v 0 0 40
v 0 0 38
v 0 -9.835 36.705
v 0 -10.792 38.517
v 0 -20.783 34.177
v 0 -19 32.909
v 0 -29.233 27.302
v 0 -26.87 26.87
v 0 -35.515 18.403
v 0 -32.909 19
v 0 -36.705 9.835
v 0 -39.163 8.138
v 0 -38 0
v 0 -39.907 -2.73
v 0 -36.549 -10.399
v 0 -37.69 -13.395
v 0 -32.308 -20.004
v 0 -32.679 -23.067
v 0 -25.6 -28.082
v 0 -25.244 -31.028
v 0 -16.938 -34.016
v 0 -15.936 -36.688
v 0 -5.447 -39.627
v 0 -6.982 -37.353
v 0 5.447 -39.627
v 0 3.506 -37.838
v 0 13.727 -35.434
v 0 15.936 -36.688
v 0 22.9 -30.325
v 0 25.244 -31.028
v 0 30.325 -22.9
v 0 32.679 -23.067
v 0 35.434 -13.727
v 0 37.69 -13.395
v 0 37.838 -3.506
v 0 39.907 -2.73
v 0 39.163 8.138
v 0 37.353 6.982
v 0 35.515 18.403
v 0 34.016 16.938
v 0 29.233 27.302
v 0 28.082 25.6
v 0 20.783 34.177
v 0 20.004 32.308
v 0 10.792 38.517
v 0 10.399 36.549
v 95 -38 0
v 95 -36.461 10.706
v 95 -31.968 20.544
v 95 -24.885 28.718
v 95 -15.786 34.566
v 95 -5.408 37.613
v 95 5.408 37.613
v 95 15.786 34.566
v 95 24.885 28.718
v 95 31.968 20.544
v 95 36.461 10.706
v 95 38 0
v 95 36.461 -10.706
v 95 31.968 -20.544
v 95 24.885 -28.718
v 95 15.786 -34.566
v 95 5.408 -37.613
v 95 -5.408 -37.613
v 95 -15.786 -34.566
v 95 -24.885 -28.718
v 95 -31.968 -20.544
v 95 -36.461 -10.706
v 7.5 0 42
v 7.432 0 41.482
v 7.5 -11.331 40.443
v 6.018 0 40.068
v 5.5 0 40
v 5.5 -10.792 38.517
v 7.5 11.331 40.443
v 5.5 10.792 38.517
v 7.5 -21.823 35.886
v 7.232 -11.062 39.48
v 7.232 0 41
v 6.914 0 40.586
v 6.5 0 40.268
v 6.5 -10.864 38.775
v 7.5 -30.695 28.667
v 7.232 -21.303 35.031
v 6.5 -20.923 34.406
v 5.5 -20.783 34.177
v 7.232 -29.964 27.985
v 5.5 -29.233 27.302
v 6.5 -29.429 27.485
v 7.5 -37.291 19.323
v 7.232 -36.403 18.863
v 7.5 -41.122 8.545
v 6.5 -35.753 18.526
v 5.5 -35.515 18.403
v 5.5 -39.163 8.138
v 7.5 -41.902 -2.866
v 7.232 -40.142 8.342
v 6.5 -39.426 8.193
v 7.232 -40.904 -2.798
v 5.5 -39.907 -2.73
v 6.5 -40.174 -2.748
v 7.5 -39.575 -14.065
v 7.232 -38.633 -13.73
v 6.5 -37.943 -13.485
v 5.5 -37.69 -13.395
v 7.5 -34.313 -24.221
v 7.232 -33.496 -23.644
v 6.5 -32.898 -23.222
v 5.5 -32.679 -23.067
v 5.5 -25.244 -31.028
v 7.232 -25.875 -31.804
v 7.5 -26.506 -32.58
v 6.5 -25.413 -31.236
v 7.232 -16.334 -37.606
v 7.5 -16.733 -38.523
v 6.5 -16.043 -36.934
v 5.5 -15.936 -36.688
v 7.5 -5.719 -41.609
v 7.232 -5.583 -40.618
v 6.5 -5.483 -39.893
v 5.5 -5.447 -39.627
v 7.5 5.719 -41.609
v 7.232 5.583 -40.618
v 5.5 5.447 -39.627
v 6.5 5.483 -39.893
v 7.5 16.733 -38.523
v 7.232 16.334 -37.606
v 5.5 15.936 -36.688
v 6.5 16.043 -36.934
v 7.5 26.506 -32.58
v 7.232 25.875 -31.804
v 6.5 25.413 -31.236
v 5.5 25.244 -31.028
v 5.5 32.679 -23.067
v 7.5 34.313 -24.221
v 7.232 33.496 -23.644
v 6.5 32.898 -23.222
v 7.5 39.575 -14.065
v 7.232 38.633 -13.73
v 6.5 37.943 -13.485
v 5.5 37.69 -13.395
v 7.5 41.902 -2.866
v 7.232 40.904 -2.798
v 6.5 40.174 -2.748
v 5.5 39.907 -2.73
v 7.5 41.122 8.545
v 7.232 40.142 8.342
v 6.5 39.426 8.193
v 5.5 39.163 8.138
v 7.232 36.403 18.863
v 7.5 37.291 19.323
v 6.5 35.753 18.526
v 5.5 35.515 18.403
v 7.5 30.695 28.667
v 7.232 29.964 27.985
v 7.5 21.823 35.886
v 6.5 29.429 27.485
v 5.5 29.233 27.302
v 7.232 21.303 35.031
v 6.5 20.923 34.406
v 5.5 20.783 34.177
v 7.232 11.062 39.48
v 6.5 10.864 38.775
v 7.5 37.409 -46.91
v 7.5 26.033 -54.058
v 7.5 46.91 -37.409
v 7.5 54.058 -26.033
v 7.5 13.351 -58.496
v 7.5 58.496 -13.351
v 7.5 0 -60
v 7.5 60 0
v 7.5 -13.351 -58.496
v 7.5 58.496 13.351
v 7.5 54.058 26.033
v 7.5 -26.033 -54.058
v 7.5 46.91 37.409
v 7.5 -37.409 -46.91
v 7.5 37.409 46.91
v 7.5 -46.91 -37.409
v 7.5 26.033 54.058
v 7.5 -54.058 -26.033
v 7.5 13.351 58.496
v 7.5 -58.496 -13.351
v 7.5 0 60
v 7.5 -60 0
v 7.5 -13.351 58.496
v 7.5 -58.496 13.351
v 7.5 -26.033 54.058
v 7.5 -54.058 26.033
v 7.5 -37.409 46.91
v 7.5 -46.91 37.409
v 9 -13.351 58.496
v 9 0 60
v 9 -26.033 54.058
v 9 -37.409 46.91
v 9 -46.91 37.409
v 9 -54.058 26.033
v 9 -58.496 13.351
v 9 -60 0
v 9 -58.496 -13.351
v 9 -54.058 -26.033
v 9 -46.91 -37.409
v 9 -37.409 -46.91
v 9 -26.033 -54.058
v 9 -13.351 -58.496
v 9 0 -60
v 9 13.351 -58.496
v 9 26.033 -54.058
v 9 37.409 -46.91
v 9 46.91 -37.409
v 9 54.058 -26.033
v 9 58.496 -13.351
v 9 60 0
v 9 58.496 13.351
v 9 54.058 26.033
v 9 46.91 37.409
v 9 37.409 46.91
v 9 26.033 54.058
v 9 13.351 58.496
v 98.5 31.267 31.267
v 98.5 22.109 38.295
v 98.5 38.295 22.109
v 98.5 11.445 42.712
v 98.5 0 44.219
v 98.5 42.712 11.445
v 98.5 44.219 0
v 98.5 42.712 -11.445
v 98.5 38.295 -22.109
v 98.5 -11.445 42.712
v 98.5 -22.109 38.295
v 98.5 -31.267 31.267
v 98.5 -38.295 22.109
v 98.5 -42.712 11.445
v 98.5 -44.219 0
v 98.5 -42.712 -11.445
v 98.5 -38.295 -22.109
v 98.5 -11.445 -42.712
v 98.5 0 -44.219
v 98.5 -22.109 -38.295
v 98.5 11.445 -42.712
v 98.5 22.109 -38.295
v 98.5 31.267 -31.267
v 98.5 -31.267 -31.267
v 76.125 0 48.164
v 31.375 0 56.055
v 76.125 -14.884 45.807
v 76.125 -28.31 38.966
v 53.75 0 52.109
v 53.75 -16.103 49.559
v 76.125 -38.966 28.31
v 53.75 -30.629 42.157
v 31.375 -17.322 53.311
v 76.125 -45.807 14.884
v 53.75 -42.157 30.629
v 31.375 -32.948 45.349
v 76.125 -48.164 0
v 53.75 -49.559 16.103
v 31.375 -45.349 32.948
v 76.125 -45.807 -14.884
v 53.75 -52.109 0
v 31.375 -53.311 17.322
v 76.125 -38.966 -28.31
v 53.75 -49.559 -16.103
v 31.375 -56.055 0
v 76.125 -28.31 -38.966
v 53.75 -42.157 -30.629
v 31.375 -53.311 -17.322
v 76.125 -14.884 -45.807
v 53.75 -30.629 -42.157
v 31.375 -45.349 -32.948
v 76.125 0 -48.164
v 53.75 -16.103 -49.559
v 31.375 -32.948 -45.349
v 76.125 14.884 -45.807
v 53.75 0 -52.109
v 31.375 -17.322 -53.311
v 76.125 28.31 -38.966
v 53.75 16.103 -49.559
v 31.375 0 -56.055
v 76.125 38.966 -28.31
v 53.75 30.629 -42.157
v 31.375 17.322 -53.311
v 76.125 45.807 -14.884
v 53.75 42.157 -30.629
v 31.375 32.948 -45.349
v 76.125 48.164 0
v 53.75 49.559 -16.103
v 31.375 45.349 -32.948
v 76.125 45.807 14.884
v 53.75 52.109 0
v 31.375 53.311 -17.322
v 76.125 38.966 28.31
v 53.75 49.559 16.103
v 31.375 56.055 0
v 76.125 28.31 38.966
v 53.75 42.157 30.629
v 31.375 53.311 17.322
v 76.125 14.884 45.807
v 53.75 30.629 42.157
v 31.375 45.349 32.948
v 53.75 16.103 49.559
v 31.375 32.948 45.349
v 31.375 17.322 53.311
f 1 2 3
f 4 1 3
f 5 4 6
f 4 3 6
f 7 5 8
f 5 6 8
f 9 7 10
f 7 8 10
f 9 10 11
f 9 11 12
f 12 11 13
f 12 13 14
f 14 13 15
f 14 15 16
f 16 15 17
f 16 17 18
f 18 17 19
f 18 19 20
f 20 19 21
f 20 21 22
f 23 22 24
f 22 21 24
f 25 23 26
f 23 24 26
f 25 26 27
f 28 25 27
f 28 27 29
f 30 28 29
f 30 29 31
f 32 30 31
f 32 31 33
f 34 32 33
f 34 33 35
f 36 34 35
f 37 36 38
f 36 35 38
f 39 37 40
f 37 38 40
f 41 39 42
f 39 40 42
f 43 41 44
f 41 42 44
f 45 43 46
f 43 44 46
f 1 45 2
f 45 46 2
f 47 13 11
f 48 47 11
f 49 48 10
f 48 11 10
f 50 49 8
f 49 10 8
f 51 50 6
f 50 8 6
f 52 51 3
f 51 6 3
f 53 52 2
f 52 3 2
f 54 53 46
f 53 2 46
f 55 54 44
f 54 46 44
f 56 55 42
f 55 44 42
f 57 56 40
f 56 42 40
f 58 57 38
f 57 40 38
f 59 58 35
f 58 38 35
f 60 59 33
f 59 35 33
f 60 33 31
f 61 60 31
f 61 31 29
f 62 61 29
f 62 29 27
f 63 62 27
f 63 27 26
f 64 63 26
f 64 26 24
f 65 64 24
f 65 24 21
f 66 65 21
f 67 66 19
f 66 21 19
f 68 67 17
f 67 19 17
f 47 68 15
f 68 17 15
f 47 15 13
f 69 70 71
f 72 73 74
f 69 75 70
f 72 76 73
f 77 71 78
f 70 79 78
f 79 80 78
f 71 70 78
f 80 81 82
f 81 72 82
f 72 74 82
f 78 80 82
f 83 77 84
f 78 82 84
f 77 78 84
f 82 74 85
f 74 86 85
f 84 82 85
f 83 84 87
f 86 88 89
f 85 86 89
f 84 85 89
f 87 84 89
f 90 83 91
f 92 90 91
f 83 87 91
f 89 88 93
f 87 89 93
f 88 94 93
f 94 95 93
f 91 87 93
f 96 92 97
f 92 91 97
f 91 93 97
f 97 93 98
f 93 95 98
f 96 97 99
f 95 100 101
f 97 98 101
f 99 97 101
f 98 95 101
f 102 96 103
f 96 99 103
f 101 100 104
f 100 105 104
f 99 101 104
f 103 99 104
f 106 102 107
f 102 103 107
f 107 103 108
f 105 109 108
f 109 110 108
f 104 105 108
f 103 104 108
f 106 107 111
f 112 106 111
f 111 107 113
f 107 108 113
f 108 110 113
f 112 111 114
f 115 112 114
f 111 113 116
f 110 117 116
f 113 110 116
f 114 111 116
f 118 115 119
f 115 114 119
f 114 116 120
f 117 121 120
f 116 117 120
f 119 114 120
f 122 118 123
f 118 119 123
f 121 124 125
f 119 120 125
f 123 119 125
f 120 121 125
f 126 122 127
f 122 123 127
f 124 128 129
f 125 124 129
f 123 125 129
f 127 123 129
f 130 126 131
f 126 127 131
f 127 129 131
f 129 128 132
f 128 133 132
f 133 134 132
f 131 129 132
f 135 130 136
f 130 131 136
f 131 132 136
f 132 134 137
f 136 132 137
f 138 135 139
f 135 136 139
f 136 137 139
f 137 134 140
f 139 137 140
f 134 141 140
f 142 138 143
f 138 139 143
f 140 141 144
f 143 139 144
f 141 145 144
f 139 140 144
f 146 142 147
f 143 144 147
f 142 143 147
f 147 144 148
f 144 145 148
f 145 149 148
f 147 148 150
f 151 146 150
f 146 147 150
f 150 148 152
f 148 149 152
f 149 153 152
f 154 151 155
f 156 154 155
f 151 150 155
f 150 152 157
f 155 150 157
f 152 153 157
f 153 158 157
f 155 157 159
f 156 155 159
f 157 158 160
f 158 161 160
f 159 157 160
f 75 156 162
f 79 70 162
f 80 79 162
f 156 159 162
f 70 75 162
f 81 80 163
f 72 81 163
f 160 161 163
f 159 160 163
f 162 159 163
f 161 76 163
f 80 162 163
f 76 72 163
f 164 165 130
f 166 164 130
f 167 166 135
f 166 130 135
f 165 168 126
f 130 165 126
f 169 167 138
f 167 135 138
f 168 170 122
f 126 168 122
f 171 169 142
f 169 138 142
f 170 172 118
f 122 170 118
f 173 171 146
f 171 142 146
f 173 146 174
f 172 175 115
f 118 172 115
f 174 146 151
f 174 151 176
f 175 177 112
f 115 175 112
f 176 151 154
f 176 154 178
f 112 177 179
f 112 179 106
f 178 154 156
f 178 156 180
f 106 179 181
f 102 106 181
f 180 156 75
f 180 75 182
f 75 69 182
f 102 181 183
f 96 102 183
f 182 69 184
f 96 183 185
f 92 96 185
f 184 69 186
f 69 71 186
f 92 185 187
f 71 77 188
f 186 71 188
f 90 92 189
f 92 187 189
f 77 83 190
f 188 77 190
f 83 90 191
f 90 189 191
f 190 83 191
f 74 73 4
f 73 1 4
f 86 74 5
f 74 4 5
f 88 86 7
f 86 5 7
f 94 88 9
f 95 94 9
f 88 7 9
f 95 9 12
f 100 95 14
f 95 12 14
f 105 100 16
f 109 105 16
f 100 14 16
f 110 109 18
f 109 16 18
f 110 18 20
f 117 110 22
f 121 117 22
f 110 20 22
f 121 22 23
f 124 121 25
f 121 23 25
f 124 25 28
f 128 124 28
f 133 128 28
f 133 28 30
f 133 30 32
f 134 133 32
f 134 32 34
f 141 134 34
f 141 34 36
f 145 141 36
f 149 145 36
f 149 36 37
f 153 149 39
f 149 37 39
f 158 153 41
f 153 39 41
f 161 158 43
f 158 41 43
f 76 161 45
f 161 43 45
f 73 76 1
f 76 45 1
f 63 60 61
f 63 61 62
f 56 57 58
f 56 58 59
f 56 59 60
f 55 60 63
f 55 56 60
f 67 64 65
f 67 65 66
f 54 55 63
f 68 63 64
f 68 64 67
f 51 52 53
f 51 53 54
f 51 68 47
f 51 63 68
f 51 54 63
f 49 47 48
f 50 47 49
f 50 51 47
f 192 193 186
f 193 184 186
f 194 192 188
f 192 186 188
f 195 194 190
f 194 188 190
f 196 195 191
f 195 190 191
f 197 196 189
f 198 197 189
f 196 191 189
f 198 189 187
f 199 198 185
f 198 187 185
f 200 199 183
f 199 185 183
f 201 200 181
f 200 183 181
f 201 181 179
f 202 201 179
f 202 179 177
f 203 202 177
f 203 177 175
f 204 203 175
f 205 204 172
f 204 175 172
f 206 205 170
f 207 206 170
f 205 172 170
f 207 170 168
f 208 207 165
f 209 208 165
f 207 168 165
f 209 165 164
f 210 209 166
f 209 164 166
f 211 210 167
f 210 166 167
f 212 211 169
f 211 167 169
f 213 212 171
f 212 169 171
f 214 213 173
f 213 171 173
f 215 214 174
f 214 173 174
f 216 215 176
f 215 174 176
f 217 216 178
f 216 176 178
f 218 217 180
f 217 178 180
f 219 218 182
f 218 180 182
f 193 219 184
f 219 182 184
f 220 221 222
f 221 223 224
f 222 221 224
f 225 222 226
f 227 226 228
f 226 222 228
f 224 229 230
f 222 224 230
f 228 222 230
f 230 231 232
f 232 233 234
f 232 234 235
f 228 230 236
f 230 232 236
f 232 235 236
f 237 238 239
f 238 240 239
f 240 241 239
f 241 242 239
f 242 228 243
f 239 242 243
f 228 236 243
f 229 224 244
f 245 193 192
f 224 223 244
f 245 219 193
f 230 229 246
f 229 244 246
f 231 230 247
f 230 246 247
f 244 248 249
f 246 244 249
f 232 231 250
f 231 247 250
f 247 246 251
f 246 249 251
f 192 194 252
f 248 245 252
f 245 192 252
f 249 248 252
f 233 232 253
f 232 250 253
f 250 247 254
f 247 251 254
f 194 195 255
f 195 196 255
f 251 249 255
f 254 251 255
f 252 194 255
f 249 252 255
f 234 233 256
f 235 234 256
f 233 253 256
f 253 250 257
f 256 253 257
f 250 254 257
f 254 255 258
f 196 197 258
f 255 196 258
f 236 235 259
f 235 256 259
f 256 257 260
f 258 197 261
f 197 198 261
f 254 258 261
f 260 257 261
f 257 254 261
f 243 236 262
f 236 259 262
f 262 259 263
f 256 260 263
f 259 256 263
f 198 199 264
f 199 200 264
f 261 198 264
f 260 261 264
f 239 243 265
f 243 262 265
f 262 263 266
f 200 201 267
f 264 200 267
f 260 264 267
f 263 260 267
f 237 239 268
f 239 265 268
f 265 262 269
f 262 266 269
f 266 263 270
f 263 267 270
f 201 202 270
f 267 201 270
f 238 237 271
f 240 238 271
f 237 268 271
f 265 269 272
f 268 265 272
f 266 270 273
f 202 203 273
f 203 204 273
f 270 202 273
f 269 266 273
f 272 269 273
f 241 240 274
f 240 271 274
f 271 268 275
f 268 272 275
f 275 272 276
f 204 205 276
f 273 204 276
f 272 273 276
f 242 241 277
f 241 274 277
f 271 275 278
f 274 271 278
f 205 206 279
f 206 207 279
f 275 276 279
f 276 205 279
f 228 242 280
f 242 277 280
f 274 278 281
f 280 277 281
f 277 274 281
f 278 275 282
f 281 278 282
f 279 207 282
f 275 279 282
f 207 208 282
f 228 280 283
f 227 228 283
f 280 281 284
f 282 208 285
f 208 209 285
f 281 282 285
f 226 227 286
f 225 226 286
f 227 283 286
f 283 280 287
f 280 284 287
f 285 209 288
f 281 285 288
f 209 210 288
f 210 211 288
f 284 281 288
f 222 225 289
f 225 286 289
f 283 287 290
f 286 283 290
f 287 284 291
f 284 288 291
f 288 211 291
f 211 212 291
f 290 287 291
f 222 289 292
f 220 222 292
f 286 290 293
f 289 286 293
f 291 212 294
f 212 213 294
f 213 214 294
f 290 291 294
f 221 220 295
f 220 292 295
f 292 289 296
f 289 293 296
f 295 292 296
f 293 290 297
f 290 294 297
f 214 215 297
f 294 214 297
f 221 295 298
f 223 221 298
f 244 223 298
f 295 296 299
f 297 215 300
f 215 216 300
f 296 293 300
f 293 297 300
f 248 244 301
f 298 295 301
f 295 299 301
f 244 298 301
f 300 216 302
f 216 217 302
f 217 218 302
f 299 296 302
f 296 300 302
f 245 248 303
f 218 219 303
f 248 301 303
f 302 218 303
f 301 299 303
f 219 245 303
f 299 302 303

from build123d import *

# Parameters (mm, degrees)
F2_R     = 38
F3_DEPTH = 95


with BuildPart() as f1:
    # F0 (on Front) → F1 (revolve)
    with BuildSketch(Plane.XZ):
        with BuildLine():
            Line((5.073e-07, 40.0000000001), (-1e-10, 0))
            Line((0, 0), (7.5000005075, -7e-10))
            Line((7.5000005075, -7e-10), (7.5000005075, 42.0000000001))
            ThreePointArc((7.5000005075, 42.0000000001), (6.9142140698, 40.5857864377), (5.5000005075, 40.0000000001))
            Line((5.5000005075, 40.0000000001), (5.073e-07, 40.0000000001))
        make_face()
        Polygon((7.5000005075, 42.0000000001), (7.5000005075, -7e-10), (9.0000005075, -9e-10), (9.0000005075, 59.9999999993), (7.5000005075, 59.9999999993), align=None)
        Polygon((9.0000005075, 59.9999999993), (9.0000005075, -9e-10), (98.5000005577, -9.5e-09), (98.5000005577, 43.954244746), (98.5000005577, 44.218735217), align=None)
    revolve(axis=Axis((46.8394961208, 0, 0), (1, 0, 0)))

    # F2 (on face) → F3 (cut)
    with BuildSketch(Plane(origin=(2.536e-07, 0, 0), x_dir=(0, -1, 0), z_dir=(-1, 0, 0))):
        Circle(F2_R)
    extrude(amount=-F3_DEPTH, mode=Mode.SUBTRACT)


solid = f1.part
